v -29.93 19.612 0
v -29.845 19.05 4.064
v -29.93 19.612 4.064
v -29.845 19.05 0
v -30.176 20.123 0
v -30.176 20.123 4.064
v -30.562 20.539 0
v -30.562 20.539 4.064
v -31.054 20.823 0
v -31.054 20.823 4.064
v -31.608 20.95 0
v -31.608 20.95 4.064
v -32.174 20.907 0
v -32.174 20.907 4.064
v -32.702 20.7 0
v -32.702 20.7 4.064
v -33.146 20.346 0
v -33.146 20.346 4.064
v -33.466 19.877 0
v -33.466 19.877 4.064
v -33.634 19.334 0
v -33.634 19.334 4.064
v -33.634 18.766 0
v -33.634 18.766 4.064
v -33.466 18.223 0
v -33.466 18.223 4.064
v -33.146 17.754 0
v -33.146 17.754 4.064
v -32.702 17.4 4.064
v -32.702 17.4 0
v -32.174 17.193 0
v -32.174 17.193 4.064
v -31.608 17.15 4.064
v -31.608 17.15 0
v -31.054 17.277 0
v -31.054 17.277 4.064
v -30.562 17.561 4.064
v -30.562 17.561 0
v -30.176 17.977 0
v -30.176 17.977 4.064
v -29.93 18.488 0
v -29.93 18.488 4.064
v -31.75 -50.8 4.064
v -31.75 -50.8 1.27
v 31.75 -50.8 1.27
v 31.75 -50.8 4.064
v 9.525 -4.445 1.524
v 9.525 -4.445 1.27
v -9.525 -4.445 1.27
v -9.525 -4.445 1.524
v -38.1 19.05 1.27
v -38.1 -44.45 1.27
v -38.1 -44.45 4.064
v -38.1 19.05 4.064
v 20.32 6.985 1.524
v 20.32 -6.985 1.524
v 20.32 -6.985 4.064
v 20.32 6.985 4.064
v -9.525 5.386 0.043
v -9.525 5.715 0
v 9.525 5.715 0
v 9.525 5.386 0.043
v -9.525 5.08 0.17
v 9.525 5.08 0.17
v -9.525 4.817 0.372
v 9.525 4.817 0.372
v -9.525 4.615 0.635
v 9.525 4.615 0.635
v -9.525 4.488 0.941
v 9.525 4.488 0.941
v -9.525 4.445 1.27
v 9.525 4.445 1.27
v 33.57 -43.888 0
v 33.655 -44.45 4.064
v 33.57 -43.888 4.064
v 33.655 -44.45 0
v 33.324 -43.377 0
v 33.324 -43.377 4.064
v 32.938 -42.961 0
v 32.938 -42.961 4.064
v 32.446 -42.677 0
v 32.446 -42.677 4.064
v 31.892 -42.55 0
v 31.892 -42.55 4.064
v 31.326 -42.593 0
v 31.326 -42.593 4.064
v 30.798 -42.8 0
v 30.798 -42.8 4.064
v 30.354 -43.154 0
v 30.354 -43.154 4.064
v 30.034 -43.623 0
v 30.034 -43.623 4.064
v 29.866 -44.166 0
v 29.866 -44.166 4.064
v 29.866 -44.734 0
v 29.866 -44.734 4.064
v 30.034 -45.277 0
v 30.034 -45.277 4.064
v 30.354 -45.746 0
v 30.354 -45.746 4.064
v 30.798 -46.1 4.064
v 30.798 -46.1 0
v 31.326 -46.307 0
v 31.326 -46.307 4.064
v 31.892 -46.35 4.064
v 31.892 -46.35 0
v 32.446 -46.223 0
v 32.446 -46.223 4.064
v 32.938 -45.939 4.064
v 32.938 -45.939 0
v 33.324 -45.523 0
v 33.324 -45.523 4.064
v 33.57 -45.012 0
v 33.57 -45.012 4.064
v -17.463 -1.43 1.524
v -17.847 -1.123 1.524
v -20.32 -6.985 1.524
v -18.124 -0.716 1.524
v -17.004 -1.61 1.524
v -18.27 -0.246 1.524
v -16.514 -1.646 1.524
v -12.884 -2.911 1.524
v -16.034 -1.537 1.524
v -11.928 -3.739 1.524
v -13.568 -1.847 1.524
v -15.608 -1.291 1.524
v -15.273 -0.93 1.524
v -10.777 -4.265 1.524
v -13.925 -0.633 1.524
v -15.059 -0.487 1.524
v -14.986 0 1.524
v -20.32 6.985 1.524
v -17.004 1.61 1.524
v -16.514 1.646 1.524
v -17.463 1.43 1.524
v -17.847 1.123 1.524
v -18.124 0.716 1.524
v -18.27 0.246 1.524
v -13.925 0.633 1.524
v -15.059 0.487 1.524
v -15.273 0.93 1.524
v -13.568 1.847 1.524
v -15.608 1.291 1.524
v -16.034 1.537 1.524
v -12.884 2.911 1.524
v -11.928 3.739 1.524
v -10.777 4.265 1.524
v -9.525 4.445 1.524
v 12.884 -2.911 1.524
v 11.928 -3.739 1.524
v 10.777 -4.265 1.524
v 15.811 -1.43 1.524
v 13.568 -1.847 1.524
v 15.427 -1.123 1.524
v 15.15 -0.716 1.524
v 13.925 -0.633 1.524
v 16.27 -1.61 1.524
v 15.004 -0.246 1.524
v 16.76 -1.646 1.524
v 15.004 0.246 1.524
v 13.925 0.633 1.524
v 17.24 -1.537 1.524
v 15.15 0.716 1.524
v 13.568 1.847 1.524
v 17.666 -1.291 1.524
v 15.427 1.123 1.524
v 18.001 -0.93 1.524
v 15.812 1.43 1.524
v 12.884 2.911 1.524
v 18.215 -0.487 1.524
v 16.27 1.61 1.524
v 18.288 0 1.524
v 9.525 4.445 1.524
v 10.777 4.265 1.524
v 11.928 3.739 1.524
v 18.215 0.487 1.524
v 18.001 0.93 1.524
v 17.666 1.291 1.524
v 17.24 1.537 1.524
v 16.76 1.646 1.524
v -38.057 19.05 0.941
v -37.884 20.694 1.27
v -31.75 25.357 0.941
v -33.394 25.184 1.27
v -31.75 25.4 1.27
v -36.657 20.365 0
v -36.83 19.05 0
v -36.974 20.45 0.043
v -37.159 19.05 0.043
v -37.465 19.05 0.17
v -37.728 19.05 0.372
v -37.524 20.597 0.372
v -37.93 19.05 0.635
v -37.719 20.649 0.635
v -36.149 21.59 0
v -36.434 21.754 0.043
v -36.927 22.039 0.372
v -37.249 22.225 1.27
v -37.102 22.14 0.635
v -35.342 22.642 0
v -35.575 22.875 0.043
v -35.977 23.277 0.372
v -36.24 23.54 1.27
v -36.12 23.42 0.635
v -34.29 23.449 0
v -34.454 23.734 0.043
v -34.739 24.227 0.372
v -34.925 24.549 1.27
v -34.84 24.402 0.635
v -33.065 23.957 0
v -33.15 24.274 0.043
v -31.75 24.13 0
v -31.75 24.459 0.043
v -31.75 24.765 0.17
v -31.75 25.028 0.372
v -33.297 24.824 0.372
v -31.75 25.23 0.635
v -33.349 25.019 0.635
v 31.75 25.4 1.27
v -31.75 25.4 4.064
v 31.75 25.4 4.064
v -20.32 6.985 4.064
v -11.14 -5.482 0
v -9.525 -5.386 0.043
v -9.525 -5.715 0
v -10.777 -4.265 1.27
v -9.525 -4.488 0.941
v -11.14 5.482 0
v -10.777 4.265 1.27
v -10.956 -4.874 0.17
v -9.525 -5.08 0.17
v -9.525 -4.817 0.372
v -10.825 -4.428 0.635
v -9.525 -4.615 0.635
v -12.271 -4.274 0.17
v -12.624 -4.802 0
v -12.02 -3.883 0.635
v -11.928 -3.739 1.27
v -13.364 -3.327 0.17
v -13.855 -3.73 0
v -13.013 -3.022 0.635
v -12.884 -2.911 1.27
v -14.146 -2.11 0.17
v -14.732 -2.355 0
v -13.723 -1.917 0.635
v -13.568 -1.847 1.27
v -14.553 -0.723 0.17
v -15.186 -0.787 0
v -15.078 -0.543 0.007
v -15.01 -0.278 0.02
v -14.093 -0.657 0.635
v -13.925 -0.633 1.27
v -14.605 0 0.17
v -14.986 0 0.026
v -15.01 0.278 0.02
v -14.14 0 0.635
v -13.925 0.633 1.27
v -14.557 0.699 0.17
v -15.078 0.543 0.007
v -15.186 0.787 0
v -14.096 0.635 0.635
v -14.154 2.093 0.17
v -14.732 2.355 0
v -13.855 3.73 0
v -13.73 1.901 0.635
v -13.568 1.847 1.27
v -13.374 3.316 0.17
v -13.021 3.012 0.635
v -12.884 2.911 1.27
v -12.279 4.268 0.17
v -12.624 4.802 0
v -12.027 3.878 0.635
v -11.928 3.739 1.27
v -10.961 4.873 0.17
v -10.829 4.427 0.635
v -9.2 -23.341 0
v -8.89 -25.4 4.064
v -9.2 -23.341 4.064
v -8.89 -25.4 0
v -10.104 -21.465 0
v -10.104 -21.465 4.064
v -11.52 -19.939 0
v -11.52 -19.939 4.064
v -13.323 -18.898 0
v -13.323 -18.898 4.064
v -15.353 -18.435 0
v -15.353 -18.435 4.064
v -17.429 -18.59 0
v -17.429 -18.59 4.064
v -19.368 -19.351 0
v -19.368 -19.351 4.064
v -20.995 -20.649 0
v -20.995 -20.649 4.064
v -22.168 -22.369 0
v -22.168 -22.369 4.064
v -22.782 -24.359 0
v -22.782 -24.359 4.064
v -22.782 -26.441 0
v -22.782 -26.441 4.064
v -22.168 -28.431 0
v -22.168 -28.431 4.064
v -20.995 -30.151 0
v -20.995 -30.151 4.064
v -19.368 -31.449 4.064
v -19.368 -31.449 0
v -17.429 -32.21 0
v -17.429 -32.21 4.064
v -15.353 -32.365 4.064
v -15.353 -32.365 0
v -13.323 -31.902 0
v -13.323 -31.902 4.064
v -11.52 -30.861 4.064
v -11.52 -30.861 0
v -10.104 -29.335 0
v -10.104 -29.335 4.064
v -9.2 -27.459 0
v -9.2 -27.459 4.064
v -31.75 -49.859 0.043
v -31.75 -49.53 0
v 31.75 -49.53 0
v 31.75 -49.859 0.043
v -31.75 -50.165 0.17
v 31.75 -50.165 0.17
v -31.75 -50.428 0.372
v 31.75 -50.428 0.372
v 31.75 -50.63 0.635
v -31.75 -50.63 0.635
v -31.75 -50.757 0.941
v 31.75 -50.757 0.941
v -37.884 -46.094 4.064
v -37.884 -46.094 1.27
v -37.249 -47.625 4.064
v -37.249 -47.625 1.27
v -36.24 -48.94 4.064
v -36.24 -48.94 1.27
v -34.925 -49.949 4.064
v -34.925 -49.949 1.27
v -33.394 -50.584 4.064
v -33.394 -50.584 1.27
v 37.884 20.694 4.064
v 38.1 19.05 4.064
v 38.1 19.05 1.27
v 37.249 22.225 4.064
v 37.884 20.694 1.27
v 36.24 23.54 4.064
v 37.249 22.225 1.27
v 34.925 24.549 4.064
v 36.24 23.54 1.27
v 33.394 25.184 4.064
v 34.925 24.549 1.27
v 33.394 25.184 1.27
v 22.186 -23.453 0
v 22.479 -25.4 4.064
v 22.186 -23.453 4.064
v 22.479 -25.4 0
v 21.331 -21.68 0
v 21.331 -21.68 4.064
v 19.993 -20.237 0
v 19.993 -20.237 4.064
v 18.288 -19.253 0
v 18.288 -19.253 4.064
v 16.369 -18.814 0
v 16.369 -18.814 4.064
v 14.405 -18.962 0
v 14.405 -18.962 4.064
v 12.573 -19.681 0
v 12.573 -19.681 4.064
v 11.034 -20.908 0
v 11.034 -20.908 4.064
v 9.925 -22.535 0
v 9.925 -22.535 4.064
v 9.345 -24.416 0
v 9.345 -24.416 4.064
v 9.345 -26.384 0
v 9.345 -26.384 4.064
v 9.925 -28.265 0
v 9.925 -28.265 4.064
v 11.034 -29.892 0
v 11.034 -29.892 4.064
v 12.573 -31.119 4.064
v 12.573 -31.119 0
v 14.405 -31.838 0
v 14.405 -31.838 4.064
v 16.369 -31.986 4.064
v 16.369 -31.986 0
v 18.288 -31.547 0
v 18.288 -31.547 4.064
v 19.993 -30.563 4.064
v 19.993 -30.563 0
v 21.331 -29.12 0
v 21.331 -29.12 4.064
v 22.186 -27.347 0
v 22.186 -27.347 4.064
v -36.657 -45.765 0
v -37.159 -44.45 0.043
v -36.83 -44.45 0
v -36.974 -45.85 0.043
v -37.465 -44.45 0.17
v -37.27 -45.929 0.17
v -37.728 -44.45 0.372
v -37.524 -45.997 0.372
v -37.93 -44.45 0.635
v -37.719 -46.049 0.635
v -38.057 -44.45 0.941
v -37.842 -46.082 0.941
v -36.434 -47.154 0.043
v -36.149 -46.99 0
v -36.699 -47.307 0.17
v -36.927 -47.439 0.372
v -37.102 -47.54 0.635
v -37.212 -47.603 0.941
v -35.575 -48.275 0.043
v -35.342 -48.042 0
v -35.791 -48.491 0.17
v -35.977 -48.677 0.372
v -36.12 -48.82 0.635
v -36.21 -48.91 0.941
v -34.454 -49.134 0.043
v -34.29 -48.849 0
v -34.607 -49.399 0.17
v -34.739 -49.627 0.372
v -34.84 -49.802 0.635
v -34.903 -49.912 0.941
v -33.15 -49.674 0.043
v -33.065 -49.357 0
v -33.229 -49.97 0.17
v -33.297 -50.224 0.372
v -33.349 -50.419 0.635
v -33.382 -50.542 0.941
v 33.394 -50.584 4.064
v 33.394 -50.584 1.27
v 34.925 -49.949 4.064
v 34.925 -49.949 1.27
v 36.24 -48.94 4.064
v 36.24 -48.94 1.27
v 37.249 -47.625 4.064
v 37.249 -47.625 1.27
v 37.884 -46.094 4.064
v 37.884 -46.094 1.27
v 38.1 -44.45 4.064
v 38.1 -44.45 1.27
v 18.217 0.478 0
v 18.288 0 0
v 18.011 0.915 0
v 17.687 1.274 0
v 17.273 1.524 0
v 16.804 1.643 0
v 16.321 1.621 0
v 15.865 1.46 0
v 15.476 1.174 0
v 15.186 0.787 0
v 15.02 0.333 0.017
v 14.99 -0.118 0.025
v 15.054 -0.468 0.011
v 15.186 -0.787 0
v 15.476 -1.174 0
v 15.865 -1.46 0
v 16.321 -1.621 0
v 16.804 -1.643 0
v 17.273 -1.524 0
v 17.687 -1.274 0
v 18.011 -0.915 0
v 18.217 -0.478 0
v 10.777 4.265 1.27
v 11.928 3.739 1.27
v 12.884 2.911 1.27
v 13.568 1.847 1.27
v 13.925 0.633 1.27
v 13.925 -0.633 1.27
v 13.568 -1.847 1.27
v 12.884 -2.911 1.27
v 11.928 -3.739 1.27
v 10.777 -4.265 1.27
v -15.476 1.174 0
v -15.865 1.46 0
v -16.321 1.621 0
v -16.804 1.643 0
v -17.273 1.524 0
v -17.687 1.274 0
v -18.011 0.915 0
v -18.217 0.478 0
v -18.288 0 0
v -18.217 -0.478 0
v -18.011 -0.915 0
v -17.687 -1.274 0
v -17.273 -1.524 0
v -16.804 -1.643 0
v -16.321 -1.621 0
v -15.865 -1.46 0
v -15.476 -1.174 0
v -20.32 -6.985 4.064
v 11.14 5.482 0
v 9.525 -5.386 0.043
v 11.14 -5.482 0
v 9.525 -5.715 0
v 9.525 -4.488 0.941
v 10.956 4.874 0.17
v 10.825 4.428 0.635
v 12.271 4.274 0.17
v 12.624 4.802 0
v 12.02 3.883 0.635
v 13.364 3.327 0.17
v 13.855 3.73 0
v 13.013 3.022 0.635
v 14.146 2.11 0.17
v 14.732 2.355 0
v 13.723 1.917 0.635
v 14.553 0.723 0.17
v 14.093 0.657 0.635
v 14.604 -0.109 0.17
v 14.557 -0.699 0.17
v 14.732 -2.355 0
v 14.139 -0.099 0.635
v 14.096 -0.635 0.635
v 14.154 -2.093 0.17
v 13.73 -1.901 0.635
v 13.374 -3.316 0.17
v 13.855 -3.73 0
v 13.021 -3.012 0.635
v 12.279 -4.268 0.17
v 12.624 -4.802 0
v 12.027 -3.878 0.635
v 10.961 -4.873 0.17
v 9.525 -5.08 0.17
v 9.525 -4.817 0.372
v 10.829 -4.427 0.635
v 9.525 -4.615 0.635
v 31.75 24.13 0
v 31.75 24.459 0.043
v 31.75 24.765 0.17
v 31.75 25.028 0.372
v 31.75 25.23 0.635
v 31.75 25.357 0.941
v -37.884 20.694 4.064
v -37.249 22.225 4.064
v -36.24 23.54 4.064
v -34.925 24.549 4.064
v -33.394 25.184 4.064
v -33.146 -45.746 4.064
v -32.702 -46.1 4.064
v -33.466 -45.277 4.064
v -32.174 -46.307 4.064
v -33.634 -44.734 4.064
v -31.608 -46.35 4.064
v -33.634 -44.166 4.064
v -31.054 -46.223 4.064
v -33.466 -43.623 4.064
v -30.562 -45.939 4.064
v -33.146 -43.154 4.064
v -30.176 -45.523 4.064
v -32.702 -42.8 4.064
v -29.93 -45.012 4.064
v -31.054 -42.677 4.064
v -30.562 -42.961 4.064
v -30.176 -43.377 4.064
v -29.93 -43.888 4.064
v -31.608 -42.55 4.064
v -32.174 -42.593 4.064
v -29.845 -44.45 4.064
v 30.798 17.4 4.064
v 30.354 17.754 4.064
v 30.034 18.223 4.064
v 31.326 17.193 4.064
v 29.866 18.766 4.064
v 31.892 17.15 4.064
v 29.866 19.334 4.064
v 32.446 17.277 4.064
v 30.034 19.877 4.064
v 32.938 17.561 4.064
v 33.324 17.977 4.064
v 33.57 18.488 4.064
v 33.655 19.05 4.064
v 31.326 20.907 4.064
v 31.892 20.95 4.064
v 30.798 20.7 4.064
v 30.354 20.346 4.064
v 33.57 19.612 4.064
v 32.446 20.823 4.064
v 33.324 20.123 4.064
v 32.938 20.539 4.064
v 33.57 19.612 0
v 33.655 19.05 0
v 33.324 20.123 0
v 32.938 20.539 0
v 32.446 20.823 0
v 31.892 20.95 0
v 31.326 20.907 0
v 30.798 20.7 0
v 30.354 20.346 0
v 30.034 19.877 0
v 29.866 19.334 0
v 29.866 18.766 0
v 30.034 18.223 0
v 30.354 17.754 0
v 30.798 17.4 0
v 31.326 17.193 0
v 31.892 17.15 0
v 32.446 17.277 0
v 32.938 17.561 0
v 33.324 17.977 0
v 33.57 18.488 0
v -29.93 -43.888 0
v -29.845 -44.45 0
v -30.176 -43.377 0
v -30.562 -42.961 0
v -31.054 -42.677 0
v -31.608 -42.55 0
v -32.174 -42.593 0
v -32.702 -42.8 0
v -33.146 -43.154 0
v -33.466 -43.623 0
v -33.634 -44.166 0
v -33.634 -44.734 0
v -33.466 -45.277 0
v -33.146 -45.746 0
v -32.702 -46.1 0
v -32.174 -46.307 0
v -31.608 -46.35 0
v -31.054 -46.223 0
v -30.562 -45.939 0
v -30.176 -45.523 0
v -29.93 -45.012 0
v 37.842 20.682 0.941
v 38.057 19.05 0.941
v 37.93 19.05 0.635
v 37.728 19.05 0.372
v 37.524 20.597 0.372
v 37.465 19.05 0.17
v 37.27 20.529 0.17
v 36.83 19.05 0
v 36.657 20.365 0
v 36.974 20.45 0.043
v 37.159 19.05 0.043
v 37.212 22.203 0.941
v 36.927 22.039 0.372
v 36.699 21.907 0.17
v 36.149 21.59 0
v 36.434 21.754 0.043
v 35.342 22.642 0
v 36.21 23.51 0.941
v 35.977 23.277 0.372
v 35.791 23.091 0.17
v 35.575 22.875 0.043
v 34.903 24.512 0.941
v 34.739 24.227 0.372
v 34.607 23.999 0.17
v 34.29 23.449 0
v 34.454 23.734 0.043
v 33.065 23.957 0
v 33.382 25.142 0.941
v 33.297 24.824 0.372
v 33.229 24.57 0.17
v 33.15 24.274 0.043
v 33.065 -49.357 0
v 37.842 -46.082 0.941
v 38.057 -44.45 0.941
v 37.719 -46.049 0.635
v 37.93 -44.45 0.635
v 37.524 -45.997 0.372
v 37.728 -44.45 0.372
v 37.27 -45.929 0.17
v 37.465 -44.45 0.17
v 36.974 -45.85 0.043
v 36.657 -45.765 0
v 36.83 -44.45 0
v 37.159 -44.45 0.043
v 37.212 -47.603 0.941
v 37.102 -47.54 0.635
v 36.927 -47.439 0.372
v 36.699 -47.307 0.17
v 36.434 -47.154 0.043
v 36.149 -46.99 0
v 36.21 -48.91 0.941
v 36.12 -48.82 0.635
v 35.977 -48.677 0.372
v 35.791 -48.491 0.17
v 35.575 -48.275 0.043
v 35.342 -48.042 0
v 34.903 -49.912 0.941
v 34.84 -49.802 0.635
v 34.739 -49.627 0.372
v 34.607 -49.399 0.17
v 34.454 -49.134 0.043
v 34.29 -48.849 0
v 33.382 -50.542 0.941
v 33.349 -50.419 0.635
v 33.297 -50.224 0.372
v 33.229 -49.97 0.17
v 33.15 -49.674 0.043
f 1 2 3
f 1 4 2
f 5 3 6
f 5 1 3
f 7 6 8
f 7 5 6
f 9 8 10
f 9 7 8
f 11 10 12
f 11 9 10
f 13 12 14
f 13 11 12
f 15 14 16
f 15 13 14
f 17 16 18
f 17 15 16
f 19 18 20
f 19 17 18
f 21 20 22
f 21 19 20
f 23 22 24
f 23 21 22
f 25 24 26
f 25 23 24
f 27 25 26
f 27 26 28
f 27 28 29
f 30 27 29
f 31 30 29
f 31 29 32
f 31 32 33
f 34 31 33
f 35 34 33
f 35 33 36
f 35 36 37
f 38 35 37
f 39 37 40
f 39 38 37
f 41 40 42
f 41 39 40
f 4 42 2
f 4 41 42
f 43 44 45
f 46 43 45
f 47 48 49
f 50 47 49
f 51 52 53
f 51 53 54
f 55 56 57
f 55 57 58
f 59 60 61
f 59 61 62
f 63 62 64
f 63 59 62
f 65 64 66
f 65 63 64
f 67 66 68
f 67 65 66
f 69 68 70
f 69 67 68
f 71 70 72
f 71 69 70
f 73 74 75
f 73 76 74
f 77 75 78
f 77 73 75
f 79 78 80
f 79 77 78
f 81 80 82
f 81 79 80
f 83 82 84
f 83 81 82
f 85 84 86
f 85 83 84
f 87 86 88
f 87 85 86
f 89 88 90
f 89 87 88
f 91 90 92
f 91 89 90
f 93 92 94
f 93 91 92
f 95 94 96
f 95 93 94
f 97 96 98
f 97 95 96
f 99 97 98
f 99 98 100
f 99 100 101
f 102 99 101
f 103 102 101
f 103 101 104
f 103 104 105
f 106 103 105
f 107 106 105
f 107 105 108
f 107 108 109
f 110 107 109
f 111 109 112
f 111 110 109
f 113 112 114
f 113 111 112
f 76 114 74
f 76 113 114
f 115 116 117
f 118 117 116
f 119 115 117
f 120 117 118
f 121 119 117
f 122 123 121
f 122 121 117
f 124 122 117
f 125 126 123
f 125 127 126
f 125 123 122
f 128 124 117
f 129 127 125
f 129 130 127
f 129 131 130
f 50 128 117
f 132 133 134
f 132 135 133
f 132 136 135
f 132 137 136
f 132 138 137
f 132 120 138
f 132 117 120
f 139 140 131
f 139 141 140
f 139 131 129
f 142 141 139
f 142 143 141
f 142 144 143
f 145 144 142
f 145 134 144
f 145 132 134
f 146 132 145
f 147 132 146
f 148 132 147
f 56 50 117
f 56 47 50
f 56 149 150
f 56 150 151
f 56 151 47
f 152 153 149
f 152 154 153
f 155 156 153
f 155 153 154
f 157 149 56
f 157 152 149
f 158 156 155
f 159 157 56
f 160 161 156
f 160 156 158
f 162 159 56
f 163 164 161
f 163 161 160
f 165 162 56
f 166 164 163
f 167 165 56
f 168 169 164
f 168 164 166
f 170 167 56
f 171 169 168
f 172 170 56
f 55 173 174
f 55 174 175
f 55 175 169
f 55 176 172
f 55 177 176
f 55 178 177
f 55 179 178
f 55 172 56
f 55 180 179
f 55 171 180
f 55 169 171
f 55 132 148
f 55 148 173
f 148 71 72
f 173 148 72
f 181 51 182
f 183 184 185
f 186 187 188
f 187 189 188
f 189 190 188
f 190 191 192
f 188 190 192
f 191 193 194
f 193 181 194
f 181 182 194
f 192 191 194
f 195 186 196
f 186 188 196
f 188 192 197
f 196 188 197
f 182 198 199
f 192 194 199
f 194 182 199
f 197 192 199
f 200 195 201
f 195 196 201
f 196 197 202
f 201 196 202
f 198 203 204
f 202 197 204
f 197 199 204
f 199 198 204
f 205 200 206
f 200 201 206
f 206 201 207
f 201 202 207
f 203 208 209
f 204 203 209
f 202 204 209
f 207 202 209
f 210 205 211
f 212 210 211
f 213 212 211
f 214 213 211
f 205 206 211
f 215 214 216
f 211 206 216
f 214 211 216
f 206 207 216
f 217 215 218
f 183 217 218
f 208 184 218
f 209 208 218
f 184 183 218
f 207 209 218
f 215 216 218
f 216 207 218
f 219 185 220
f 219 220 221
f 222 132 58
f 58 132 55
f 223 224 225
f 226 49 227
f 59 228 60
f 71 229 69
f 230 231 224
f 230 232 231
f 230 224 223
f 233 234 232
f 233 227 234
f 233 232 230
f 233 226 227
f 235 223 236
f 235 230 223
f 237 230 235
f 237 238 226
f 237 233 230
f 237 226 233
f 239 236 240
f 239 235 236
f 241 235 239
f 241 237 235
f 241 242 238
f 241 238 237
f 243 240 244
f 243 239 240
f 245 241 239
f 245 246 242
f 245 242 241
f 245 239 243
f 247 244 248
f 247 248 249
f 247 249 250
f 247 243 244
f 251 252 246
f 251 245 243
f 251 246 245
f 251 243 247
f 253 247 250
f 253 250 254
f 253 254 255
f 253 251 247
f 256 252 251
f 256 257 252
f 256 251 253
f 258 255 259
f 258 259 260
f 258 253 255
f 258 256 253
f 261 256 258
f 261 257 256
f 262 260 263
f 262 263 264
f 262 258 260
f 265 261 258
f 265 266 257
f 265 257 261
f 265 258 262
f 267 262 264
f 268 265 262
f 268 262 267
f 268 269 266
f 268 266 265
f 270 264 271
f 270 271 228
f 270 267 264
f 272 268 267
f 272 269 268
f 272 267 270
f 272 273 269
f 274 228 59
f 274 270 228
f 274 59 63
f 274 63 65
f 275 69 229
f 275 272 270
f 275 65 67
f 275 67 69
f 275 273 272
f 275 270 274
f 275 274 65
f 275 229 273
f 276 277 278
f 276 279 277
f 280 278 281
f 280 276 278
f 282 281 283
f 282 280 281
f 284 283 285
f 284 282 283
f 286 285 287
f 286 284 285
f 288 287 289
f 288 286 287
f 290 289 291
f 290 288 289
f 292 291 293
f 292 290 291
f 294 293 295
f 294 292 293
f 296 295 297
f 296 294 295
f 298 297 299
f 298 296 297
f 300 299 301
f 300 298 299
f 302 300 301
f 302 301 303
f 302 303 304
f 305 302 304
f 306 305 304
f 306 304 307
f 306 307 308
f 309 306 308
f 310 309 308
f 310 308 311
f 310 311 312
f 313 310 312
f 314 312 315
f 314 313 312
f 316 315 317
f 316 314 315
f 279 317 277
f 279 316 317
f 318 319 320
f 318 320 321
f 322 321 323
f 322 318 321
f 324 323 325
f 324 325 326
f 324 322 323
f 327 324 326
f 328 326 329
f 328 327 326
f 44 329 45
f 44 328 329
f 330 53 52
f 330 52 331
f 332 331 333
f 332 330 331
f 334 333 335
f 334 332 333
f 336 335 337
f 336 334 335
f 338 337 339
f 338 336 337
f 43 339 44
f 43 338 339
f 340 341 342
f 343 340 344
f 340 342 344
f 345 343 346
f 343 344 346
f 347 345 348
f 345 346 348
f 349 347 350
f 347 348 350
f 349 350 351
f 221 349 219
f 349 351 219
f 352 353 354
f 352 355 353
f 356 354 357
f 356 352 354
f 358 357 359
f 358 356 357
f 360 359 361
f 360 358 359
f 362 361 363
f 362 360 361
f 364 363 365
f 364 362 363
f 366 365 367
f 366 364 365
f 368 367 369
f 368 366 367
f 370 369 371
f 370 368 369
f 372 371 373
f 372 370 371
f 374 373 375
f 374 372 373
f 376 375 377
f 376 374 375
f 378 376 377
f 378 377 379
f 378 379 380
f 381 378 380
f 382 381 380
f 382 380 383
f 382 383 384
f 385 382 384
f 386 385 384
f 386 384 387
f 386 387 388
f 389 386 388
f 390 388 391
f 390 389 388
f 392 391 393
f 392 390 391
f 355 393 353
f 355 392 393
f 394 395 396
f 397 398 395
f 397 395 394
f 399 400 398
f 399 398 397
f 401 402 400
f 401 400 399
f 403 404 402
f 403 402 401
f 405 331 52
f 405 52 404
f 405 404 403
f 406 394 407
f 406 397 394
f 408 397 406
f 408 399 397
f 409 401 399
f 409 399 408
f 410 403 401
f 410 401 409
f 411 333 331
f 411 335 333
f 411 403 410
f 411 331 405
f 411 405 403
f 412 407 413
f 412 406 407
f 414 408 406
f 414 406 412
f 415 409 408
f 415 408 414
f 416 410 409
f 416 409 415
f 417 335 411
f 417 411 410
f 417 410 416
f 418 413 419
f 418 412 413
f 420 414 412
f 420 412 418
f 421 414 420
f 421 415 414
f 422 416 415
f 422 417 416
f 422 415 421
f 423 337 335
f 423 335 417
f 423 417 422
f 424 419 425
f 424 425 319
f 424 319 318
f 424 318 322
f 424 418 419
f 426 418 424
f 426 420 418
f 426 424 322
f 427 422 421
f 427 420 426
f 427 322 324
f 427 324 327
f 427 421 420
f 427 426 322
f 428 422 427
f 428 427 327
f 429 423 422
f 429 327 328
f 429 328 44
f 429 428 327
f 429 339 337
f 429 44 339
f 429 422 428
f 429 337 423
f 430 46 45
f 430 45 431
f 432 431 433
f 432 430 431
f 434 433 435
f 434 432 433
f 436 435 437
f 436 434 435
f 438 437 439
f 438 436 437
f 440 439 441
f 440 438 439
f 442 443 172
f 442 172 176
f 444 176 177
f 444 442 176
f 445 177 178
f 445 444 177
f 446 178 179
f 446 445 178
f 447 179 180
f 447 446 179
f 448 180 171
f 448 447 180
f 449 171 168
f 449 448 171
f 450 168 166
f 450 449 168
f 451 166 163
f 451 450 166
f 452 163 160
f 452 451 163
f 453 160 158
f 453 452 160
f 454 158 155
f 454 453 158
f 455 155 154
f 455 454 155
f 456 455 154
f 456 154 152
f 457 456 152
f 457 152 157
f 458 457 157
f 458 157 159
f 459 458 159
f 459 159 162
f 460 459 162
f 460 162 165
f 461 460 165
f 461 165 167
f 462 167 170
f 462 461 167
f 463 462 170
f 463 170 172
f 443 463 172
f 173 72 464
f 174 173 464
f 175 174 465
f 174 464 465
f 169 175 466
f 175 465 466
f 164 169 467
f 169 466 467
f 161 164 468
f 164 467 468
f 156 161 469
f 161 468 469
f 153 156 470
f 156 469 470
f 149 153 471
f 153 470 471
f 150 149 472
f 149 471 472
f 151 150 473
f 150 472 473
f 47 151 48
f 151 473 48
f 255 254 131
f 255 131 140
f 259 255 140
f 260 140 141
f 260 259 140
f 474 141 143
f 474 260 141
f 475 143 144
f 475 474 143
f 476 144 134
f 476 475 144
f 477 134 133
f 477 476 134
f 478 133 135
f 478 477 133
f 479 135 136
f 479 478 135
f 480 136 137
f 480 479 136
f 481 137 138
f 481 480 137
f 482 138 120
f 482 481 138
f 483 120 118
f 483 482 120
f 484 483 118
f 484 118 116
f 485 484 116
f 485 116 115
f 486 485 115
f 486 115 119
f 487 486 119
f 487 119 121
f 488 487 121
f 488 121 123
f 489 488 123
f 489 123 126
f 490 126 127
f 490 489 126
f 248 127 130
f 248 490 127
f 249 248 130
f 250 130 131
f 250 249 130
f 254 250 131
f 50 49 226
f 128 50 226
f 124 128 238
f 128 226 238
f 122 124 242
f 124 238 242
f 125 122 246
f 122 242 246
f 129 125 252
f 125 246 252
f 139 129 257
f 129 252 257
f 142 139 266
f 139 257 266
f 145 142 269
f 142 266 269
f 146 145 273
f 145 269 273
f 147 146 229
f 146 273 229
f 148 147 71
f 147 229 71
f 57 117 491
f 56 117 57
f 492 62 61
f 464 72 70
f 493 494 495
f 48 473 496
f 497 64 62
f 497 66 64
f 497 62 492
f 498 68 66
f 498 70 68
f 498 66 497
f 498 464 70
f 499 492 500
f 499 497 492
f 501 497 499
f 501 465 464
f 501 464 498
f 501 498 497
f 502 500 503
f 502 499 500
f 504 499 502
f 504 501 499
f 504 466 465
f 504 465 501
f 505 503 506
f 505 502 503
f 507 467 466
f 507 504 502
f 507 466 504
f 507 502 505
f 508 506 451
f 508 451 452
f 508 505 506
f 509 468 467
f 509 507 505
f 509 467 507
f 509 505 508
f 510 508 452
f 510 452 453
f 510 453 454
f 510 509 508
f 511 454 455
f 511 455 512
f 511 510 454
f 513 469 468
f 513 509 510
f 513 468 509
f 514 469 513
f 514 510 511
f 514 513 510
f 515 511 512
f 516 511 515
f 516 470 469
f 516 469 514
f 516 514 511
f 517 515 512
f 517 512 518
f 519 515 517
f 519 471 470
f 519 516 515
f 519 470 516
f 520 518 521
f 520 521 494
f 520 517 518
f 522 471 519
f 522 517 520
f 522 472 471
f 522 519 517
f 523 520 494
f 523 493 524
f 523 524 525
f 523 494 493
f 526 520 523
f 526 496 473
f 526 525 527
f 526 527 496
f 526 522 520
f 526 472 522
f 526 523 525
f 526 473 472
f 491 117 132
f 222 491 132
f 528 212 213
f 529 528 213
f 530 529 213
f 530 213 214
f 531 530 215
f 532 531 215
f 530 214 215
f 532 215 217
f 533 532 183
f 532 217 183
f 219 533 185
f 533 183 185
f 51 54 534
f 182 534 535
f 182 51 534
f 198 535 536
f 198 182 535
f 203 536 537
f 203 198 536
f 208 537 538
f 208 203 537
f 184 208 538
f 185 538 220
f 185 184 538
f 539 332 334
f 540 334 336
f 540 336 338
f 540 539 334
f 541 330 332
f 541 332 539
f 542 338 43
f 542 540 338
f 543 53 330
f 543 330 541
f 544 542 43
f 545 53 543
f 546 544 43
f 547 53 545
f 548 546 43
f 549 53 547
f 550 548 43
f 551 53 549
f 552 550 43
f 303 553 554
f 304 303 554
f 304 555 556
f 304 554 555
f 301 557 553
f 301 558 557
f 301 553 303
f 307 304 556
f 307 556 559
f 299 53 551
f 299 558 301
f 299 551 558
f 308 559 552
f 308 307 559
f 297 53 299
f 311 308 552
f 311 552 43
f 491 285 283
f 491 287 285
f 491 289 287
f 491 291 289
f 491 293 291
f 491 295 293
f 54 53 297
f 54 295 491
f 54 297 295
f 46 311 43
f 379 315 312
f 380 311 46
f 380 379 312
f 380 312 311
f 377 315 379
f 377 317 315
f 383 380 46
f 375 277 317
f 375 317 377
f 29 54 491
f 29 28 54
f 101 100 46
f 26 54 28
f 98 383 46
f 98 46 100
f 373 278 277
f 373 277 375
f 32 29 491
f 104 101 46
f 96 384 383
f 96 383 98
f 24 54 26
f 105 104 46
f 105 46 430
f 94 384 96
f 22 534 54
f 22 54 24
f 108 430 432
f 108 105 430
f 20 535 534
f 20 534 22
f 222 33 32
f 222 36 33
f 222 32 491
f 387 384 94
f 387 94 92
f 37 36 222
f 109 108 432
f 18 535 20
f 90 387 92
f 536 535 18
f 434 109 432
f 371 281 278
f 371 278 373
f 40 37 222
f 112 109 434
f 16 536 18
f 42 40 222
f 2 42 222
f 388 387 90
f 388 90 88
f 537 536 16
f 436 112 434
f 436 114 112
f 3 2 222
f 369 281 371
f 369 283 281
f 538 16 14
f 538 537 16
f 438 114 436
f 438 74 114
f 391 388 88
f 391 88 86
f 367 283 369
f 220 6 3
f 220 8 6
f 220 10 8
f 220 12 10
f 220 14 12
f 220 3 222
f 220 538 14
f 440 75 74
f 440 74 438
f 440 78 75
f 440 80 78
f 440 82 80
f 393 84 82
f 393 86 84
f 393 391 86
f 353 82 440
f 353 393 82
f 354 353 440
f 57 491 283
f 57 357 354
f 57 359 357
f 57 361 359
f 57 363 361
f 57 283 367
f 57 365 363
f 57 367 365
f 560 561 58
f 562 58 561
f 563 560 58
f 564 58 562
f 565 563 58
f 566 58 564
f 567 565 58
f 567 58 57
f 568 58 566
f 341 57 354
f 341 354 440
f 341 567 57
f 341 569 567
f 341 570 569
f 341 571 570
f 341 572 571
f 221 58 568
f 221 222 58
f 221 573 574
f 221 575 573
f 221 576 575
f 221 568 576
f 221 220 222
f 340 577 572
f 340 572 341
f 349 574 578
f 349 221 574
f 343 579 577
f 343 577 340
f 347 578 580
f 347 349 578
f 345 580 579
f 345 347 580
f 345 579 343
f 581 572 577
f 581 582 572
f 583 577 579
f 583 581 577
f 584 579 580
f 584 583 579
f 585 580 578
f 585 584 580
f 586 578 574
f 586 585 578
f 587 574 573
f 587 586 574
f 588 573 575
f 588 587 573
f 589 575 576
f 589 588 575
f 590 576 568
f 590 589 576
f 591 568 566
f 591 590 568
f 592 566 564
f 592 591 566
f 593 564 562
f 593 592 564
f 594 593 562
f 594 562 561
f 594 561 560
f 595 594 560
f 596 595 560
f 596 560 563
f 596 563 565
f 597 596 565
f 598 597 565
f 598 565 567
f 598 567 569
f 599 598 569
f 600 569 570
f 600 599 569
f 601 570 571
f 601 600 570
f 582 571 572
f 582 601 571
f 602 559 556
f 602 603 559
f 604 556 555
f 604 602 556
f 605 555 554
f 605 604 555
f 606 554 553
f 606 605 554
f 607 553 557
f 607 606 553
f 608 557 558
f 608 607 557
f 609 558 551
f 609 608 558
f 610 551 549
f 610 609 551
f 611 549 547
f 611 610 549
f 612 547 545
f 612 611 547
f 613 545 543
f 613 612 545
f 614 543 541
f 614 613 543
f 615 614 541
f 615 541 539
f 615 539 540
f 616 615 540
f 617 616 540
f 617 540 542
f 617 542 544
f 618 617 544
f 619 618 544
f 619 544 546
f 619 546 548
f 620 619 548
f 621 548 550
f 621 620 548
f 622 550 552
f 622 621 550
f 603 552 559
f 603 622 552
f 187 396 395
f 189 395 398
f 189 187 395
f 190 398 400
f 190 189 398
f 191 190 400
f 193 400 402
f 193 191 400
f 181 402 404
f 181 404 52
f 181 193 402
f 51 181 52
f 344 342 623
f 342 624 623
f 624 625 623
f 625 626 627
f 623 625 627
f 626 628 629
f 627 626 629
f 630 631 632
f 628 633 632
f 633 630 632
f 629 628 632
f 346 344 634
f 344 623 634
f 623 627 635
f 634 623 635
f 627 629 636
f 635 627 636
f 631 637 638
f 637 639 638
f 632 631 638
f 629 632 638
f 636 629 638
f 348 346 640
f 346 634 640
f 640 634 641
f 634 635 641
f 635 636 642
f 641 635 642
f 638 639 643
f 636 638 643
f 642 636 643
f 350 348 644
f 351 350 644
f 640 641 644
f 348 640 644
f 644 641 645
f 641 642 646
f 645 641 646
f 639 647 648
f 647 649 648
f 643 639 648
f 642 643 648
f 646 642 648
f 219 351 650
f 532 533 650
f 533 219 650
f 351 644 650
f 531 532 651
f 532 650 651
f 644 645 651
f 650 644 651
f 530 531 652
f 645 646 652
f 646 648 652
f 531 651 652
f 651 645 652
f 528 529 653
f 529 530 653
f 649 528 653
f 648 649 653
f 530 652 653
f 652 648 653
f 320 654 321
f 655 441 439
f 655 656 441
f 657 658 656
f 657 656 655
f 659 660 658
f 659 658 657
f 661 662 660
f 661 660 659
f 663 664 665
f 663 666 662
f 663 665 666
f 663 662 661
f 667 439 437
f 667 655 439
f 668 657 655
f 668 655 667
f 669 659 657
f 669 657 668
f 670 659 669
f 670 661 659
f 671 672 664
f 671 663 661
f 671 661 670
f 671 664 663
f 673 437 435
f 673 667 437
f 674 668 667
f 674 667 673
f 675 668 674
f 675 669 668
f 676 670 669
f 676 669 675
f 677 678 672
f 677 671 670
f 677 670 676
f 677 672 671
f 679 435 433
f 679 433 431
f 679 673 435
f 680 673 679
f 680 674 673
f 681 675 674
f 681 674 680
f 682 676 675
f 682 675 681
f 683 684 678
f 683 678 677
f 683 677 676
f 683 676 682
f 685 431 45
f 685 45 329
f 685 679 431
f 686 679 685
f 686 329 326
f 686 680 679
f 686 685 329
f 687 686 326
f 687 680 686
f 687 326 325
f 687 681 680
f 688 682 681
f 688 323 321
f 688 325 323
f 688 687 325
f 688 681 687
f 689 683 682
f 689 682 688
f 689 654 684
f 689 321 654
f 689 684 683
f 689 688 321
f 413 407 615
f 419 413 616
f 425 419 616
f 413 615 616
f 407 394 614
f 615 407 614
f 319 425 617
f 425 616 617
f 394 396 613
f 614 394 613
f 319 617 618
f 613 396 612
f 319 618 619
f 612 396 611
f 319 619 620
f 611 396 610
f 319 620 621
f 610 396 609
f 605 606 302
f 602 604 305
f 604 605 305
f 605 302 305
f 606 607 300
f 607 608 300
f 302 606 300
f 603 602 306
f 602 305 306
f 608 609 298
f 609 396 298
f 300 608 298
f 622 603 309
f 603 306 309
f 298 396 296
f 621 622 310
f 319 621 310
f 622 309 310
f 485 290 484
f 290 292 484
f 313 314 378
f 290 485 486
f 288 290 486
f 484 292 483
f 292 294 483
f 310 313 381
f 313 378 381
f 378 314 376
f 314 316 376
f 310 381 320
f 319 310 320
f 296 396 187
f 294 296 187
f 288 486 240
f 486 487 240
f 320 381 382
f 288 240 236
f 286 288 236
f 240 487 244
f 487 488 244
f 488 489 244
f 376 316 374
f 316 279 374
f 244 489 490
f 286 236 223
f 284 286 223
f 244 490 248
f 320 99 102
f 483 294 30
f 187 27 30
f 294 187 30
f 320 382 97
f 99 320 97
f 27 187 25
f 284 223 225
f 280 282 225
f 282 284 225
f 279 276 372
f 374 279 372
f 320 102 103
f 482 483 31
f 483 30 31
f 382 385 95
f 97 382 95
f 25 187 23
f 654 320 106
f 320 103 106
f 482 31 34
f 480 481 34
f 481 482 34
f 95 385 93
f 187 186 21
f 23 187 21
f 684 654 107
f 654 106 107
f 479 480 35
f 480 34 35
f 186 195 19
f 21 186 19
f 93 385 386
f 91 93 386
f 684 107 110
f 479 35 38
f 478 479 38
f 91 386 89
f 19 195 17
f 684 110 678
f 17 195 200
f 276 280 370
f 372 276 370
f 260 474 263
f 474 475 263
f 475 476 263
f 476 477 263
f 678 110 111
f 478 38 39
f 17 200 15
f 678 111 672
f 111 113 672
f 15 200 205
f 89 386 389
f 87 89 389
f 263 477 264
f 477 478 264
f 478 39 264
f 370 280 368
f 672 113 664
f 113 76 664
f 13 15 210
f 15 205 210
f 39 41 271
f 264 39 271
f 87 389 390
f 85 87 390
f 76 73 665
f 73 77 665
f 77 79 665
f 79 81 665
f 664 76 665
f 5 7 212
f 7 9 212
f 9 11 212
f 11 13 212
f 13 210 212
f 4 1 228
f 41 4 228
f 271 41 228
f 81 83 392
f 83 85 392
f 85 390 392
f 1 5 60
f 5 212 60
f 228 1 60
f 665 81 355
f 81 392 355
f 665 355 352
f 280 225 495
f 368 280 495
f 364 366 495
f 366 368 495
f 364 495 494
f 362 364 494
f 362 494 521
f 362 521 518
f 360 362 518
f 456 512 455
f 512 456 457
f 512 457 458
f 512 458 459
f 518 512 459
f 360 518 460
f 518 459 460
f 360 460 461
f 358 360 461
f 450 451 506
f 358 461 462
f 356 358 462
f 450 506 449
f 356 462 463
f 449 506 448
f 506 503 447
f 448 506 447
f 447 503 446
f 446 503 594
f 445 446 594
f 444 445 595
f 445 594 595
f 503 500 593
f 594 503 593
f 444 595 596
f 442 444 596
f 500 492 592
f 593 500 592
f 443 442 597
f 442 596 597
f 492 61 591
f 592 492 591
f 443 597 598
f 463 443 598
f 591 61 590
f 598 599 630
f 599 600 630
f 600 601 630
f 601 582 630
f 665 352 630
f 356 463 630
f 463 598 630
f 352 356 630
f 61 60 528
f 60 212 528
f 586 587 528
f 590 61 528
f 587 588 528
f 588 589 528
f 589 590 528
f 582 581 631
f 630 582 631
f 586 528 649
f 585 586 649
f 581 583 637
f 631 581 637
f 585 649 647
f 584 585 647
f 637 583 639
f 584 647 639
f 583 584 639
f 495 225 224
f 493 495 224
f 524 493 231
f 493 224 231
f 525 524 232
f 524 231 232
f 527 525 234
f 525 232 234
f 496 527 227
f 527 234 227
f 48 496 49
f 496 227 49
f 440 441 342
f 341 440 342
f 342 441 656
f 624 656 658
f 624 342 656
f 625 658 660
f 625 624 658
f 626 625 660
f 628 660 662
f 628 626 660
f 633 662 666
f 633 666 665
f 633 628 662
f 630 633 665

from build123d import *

# Parameters (mm, degrees)
F0_W         = 76.2
F0_H         = 76.2
F0_R         = 1.905
F0_R_2       = 6.985
F0_R_3       = 6.604
F0_R_4       = 1.651
F1_DEPTH     = 1.524
F2_W         = 76.2
F2_H         = 76.2
F2_R         = 1.905
F2_W_2       = 40.64
F2_H_2       = 13.97
F3_DEPTH     = 2.54
F4_R         = 6.35
F5_T1_DEPTH  = 19.05
F5_T3_DEPTH  = 63.5
F5_T5_DEPTH  = 63.5
F5_T8_ANGLE  = 90
F5_T10_ANGLE = 90
F5_T12_ANGLE = 90
F5_T14_ANGLE = 90
F5_T16_ANGLE = 180
F5_T18_ANGLE = 180
F6_DEPTH     = 2.54


# Not quite as in the source:
# - a fillet or chamfer that OpenCascade refuses, or shapes differently, is made with other operations: its cross-section is extruded or revolved along the edge and cut away or added
# - a feature names something its author has since deleted; it is built from what else it names


with BuildPart() as f1:
    # F0 (on Top) → F1 (new body)
    with BuildSketch(Plane.XY):
        with Locations((0, -12.7)):
            Rectangle(F0_W, F0_H)
        with Locations((-31.75, -44.45)):
            Circle(F0_R, mode=Mode.SUBTRACT)
        with Locations((-15.875, -25.4)):
            Circle(F0_R_2, mode=Mode.SUBTRACT)
        with Locations((31.75, -44.45)):
            Circle(F0_R, mode=Mode.SUBTRACT)
        with Locations((15.875, -25.4)):
            Circle(F0_R_3, mode=Mode.SUBTRACT)
        with Locations((-16.637, 0)):
            Circle(F0_R_4, mode=Mode.SUBTRACT)
        with Locations((-31.75, 19.05)):
            Circle(F0_R, mode=Mode.SUBTRACT)
        with BuildLine():
            ThreePointArc((-9.525, -4.445), (-13.97, 0), (-9.525, 4.445))
            Line((-9.525, 4.445), (9.525, 4.445))
            ThreePointArc((9.525, 4.445), (13.97, 0), (9.525, -4.445))
            Line((9.525, -4.445), (-9.525, -4.445))
        make_face(mode=Mode.SUBTRACT)
        with Locations((16.637, 0)):
            Circle(F0_R_4, mode=Mode.SUBTRACT)
        with Locations((31.75, 19.05)):
            Circle(F0_R, mode=Mode.SUBTRACT)
    extrude(amount=F1_DEPTH)

    # F2 (on face) → F3 (join)
    with BuildSketch(Plane.XY.offset(1.524)):
        with Locations((0, -12.7)):
            Rectangle(F2_W, F2_H)
        with Locations((-31.75, -44.45)):
            Circle(F2_R, mode=Mode.SUBTRACT)
        with Locations((31.75, -44.45)):
            Circle(F2_R, mode=Mode.SUBTRACT)
        with Locations((-31.75, 19.05)):
            Circle(F2_R, mode=Mode.SUBTRACT)
        Rectangle(F2_W_2, F2_H_2, mode=Mode.SUBTRACT)
        with Locations((31.75, 19.05)):
            Circle(F2_R, mode=Mode.SUBTRACT)
    extrude(amount=F3_DEPTH)

    # F4
    f4_edges = [f1.edges().sort_by_distance(p)[0] for p in [
        (-38.1, -50.8, 2.032),
        (38.1, -50.8, 2.032),
        (-38.1, 25.4, 2.032),
        (38.1, 25.4, 2.032),
    ]]
    fillet(f4_edges, radius=F4_R)

    # F5: fillet of radius 1.27 on 12 edges, made by hand

    # F5_s2 → F5_t1 (cut)
    with BuildSketch(Plane.YZ.offset(-9.525)):
        with BuildLine():
            ThreePointArc((5.715, 0), (4.8169743879, 0.3719743879), (4.445, 1.27))
            Line((4.445, 1.27), (4.445, 0))
            Line((4.445, 0), (5.715, 0))
        make_face()
        with BuildLine():
            ThreePointArc((-5.715, 0), (-4.8169743879, 0.3719743879), (-4.445, 1.27))
            Line((-4.445, 1.27), (-4.445, 0))
            Line((-4.445, 0), (-5.715, 0))
        make_face()
    extrude(amount=F5_T1_DEPTH, mode=Mode.SUBTRACT)

    # F5_s4 → F5_t3 (cut)
    with BuildSketch(Plane.XZ.offset(-19.05)):
        with BuildLine():
            ThreePointArc((38.1, 1.27), (37.7280256121, 0.3719743879), (36.83, 0))
            Line((36.83, 0), (38.1, 0))
            Line((38.1, 0), (38.1, 1.27))
        make_face()
        with BuildLine():
            ThreePointArc((-36.83, 0), (-37.7280256121, 0.3719743879), (-38.1, 1.27))
            Line((-38.1, 1.27), (-38.1, 0))
            Line((-38.1, 0), (-36.83, 0))
        make_face()
    extrude(amount=F5_T3_DEPTH, mode=Mode.SUBTRACT)

    # F5_s6 → F5_t5 (cut)
    with BuildSketch(Plane.YZ.offset(-31.75)):
        with BuildLine():
            ThreePointArc((-49.53, 0), (-50.4280256121, 0.3719743879), (-50.8, 1.27))
            Line((-50.8, 1.27), (-50.8, 0))
            Line((-50.8, 0), (-49.53, 0))
        make_face()
        with BuildLine():
            ThreePointArc((24.13, 0), (25.0280256121, 0.3719743879), (25.4, 1.27))
            Line((25.4, 1.27), (25.4, 0))
            Line((25.4, 0), (24.13, 0))
        make_face()
    extrude(amount=F5_T5_DEPTH, mode=Mode.SUBTRACT)

    # F5_s7 → F5_t8 (revolve, cut)
    with BuildSketch(Plane.XZ.offset(44.45)):
        with BuildLine():
            ThreePointArc((-36.83, 0), (-37.7280256121, 0.3719743879), (-38.1, 1.27))
            Line((-38.1, 1.27), (-38.1, 0))
            Line((-38.1, 0), (-36.83, 0))
        make_face()
    revolve(axis=Axis((-31.75, -44.45, 0), (0, 0, 1)), revolution_arc=F5_T8_ANGLE, mode=Mode.SUBTRACT)

    # F5_s9 → F5_t10 (revolve, cut)
    with BuildSketch(Plane.XZ.offset(44.45)):
        with BuildLine():
            ThreePointArc((38.1, 1.27), (37.7280256121, 0.3719743879), (36.83, 0))
            Line((36.83, 0), (38.1, 0))
            Line((38.1, 0), (38.1, 1.27))
        make_face()
    revolve(axis=Axis((31.75, -44.45, 0), (0, 0, -1)), revolution_arc=F5_T10_ANGLE, mode=Mode.SUBTRACT)

    # F5_s11 → F5_t12 (revolve, cut)
    with BuildSketch(Plane.XZ.offset(-19.05)):
        with BuildLine():
            ThreePointArc((38.1, 1.27), (37.7280256121, 0.3719743879), (36.83, 0))
            Line((36.83, 0), (38.1, 0))
            Line((38.1, 0), (38.1, 1.27))
        make_face()
    revolve(axis=Axis((31.75, 19.05, 0), (0, 0, 1)), revolution_arc=F5_T12_ANGLE, mode=Mode.SUBTRACT)

    # F5_s13 → F5_t14 (revolve, cut)
    with BuildSketch(Plane.XZ.offset(-19.05)):
        with BuildLine():
            ThreePointArc((-36.83, 0), (-37.7280256121, 0.3719743879), (-38.1, 1.27))
            Line((-38.1, 1.27), (-38.1, 0))
            Line((-38.1, 0), (-36.83, 0))
        make_face()
    revolve(axis=Axis((-31.75, 19.05, 0), (0, 0, -1)), revolution_arc=F5_T14_ANGLE, mode=Mode.SUBTRACT)

    # F5_s15 → F5_t16 (revolve, cut)
    with BuildSketch(Plane.YZ.offset(-9.525)):
        with BuildLine():
            ThreePointArc((-5.715, 0), (-4.8169743879, 0.3719743879), (-4.445, 1.27))
            Line((-4.445, 1.27), (-4.445, 0))
            Line((-4.445, 0), (-5.715, 0))
        make_face()
    revolve(axis=Axis((-9.525, 0, 0), (0, 0, -1)), revolution_arc=F5_T16_ANGLE, mode=Mode.SUBTRACT)

    # F5_s17 → F5_t18 (revolve, cut)
    with BuildSketch(Plane.YZ.offset(9.525)):
        with BuildLine():
            ThreePointArc((5.715, 0), (4.8169743879, 0.3719743879), (4.445, 1.27))
            Line((4.445, 1.27), (4.445, 0))
            Line((4.445, 0), (5.715, 0))
        make_face()
    revolve(axis=Axis((9.525, 0, 0), (0, 0, -1)), revolution_arc=F5_T18_ANGLE, mode=Mode.SUBTRACT)

    # F6 (cut, through all): faces of the model
    f6_faces = [f1.faces().sort_by_distance(p)[0] for p in [
        (15.875, -25.4, 1.524),
        (-15.875, -25.4, 1.524),
    ]]
    extrude(f6_faces, amount=-F6_DEPTH, mode=Mode.SUBTRACT)


solid = f1.part
